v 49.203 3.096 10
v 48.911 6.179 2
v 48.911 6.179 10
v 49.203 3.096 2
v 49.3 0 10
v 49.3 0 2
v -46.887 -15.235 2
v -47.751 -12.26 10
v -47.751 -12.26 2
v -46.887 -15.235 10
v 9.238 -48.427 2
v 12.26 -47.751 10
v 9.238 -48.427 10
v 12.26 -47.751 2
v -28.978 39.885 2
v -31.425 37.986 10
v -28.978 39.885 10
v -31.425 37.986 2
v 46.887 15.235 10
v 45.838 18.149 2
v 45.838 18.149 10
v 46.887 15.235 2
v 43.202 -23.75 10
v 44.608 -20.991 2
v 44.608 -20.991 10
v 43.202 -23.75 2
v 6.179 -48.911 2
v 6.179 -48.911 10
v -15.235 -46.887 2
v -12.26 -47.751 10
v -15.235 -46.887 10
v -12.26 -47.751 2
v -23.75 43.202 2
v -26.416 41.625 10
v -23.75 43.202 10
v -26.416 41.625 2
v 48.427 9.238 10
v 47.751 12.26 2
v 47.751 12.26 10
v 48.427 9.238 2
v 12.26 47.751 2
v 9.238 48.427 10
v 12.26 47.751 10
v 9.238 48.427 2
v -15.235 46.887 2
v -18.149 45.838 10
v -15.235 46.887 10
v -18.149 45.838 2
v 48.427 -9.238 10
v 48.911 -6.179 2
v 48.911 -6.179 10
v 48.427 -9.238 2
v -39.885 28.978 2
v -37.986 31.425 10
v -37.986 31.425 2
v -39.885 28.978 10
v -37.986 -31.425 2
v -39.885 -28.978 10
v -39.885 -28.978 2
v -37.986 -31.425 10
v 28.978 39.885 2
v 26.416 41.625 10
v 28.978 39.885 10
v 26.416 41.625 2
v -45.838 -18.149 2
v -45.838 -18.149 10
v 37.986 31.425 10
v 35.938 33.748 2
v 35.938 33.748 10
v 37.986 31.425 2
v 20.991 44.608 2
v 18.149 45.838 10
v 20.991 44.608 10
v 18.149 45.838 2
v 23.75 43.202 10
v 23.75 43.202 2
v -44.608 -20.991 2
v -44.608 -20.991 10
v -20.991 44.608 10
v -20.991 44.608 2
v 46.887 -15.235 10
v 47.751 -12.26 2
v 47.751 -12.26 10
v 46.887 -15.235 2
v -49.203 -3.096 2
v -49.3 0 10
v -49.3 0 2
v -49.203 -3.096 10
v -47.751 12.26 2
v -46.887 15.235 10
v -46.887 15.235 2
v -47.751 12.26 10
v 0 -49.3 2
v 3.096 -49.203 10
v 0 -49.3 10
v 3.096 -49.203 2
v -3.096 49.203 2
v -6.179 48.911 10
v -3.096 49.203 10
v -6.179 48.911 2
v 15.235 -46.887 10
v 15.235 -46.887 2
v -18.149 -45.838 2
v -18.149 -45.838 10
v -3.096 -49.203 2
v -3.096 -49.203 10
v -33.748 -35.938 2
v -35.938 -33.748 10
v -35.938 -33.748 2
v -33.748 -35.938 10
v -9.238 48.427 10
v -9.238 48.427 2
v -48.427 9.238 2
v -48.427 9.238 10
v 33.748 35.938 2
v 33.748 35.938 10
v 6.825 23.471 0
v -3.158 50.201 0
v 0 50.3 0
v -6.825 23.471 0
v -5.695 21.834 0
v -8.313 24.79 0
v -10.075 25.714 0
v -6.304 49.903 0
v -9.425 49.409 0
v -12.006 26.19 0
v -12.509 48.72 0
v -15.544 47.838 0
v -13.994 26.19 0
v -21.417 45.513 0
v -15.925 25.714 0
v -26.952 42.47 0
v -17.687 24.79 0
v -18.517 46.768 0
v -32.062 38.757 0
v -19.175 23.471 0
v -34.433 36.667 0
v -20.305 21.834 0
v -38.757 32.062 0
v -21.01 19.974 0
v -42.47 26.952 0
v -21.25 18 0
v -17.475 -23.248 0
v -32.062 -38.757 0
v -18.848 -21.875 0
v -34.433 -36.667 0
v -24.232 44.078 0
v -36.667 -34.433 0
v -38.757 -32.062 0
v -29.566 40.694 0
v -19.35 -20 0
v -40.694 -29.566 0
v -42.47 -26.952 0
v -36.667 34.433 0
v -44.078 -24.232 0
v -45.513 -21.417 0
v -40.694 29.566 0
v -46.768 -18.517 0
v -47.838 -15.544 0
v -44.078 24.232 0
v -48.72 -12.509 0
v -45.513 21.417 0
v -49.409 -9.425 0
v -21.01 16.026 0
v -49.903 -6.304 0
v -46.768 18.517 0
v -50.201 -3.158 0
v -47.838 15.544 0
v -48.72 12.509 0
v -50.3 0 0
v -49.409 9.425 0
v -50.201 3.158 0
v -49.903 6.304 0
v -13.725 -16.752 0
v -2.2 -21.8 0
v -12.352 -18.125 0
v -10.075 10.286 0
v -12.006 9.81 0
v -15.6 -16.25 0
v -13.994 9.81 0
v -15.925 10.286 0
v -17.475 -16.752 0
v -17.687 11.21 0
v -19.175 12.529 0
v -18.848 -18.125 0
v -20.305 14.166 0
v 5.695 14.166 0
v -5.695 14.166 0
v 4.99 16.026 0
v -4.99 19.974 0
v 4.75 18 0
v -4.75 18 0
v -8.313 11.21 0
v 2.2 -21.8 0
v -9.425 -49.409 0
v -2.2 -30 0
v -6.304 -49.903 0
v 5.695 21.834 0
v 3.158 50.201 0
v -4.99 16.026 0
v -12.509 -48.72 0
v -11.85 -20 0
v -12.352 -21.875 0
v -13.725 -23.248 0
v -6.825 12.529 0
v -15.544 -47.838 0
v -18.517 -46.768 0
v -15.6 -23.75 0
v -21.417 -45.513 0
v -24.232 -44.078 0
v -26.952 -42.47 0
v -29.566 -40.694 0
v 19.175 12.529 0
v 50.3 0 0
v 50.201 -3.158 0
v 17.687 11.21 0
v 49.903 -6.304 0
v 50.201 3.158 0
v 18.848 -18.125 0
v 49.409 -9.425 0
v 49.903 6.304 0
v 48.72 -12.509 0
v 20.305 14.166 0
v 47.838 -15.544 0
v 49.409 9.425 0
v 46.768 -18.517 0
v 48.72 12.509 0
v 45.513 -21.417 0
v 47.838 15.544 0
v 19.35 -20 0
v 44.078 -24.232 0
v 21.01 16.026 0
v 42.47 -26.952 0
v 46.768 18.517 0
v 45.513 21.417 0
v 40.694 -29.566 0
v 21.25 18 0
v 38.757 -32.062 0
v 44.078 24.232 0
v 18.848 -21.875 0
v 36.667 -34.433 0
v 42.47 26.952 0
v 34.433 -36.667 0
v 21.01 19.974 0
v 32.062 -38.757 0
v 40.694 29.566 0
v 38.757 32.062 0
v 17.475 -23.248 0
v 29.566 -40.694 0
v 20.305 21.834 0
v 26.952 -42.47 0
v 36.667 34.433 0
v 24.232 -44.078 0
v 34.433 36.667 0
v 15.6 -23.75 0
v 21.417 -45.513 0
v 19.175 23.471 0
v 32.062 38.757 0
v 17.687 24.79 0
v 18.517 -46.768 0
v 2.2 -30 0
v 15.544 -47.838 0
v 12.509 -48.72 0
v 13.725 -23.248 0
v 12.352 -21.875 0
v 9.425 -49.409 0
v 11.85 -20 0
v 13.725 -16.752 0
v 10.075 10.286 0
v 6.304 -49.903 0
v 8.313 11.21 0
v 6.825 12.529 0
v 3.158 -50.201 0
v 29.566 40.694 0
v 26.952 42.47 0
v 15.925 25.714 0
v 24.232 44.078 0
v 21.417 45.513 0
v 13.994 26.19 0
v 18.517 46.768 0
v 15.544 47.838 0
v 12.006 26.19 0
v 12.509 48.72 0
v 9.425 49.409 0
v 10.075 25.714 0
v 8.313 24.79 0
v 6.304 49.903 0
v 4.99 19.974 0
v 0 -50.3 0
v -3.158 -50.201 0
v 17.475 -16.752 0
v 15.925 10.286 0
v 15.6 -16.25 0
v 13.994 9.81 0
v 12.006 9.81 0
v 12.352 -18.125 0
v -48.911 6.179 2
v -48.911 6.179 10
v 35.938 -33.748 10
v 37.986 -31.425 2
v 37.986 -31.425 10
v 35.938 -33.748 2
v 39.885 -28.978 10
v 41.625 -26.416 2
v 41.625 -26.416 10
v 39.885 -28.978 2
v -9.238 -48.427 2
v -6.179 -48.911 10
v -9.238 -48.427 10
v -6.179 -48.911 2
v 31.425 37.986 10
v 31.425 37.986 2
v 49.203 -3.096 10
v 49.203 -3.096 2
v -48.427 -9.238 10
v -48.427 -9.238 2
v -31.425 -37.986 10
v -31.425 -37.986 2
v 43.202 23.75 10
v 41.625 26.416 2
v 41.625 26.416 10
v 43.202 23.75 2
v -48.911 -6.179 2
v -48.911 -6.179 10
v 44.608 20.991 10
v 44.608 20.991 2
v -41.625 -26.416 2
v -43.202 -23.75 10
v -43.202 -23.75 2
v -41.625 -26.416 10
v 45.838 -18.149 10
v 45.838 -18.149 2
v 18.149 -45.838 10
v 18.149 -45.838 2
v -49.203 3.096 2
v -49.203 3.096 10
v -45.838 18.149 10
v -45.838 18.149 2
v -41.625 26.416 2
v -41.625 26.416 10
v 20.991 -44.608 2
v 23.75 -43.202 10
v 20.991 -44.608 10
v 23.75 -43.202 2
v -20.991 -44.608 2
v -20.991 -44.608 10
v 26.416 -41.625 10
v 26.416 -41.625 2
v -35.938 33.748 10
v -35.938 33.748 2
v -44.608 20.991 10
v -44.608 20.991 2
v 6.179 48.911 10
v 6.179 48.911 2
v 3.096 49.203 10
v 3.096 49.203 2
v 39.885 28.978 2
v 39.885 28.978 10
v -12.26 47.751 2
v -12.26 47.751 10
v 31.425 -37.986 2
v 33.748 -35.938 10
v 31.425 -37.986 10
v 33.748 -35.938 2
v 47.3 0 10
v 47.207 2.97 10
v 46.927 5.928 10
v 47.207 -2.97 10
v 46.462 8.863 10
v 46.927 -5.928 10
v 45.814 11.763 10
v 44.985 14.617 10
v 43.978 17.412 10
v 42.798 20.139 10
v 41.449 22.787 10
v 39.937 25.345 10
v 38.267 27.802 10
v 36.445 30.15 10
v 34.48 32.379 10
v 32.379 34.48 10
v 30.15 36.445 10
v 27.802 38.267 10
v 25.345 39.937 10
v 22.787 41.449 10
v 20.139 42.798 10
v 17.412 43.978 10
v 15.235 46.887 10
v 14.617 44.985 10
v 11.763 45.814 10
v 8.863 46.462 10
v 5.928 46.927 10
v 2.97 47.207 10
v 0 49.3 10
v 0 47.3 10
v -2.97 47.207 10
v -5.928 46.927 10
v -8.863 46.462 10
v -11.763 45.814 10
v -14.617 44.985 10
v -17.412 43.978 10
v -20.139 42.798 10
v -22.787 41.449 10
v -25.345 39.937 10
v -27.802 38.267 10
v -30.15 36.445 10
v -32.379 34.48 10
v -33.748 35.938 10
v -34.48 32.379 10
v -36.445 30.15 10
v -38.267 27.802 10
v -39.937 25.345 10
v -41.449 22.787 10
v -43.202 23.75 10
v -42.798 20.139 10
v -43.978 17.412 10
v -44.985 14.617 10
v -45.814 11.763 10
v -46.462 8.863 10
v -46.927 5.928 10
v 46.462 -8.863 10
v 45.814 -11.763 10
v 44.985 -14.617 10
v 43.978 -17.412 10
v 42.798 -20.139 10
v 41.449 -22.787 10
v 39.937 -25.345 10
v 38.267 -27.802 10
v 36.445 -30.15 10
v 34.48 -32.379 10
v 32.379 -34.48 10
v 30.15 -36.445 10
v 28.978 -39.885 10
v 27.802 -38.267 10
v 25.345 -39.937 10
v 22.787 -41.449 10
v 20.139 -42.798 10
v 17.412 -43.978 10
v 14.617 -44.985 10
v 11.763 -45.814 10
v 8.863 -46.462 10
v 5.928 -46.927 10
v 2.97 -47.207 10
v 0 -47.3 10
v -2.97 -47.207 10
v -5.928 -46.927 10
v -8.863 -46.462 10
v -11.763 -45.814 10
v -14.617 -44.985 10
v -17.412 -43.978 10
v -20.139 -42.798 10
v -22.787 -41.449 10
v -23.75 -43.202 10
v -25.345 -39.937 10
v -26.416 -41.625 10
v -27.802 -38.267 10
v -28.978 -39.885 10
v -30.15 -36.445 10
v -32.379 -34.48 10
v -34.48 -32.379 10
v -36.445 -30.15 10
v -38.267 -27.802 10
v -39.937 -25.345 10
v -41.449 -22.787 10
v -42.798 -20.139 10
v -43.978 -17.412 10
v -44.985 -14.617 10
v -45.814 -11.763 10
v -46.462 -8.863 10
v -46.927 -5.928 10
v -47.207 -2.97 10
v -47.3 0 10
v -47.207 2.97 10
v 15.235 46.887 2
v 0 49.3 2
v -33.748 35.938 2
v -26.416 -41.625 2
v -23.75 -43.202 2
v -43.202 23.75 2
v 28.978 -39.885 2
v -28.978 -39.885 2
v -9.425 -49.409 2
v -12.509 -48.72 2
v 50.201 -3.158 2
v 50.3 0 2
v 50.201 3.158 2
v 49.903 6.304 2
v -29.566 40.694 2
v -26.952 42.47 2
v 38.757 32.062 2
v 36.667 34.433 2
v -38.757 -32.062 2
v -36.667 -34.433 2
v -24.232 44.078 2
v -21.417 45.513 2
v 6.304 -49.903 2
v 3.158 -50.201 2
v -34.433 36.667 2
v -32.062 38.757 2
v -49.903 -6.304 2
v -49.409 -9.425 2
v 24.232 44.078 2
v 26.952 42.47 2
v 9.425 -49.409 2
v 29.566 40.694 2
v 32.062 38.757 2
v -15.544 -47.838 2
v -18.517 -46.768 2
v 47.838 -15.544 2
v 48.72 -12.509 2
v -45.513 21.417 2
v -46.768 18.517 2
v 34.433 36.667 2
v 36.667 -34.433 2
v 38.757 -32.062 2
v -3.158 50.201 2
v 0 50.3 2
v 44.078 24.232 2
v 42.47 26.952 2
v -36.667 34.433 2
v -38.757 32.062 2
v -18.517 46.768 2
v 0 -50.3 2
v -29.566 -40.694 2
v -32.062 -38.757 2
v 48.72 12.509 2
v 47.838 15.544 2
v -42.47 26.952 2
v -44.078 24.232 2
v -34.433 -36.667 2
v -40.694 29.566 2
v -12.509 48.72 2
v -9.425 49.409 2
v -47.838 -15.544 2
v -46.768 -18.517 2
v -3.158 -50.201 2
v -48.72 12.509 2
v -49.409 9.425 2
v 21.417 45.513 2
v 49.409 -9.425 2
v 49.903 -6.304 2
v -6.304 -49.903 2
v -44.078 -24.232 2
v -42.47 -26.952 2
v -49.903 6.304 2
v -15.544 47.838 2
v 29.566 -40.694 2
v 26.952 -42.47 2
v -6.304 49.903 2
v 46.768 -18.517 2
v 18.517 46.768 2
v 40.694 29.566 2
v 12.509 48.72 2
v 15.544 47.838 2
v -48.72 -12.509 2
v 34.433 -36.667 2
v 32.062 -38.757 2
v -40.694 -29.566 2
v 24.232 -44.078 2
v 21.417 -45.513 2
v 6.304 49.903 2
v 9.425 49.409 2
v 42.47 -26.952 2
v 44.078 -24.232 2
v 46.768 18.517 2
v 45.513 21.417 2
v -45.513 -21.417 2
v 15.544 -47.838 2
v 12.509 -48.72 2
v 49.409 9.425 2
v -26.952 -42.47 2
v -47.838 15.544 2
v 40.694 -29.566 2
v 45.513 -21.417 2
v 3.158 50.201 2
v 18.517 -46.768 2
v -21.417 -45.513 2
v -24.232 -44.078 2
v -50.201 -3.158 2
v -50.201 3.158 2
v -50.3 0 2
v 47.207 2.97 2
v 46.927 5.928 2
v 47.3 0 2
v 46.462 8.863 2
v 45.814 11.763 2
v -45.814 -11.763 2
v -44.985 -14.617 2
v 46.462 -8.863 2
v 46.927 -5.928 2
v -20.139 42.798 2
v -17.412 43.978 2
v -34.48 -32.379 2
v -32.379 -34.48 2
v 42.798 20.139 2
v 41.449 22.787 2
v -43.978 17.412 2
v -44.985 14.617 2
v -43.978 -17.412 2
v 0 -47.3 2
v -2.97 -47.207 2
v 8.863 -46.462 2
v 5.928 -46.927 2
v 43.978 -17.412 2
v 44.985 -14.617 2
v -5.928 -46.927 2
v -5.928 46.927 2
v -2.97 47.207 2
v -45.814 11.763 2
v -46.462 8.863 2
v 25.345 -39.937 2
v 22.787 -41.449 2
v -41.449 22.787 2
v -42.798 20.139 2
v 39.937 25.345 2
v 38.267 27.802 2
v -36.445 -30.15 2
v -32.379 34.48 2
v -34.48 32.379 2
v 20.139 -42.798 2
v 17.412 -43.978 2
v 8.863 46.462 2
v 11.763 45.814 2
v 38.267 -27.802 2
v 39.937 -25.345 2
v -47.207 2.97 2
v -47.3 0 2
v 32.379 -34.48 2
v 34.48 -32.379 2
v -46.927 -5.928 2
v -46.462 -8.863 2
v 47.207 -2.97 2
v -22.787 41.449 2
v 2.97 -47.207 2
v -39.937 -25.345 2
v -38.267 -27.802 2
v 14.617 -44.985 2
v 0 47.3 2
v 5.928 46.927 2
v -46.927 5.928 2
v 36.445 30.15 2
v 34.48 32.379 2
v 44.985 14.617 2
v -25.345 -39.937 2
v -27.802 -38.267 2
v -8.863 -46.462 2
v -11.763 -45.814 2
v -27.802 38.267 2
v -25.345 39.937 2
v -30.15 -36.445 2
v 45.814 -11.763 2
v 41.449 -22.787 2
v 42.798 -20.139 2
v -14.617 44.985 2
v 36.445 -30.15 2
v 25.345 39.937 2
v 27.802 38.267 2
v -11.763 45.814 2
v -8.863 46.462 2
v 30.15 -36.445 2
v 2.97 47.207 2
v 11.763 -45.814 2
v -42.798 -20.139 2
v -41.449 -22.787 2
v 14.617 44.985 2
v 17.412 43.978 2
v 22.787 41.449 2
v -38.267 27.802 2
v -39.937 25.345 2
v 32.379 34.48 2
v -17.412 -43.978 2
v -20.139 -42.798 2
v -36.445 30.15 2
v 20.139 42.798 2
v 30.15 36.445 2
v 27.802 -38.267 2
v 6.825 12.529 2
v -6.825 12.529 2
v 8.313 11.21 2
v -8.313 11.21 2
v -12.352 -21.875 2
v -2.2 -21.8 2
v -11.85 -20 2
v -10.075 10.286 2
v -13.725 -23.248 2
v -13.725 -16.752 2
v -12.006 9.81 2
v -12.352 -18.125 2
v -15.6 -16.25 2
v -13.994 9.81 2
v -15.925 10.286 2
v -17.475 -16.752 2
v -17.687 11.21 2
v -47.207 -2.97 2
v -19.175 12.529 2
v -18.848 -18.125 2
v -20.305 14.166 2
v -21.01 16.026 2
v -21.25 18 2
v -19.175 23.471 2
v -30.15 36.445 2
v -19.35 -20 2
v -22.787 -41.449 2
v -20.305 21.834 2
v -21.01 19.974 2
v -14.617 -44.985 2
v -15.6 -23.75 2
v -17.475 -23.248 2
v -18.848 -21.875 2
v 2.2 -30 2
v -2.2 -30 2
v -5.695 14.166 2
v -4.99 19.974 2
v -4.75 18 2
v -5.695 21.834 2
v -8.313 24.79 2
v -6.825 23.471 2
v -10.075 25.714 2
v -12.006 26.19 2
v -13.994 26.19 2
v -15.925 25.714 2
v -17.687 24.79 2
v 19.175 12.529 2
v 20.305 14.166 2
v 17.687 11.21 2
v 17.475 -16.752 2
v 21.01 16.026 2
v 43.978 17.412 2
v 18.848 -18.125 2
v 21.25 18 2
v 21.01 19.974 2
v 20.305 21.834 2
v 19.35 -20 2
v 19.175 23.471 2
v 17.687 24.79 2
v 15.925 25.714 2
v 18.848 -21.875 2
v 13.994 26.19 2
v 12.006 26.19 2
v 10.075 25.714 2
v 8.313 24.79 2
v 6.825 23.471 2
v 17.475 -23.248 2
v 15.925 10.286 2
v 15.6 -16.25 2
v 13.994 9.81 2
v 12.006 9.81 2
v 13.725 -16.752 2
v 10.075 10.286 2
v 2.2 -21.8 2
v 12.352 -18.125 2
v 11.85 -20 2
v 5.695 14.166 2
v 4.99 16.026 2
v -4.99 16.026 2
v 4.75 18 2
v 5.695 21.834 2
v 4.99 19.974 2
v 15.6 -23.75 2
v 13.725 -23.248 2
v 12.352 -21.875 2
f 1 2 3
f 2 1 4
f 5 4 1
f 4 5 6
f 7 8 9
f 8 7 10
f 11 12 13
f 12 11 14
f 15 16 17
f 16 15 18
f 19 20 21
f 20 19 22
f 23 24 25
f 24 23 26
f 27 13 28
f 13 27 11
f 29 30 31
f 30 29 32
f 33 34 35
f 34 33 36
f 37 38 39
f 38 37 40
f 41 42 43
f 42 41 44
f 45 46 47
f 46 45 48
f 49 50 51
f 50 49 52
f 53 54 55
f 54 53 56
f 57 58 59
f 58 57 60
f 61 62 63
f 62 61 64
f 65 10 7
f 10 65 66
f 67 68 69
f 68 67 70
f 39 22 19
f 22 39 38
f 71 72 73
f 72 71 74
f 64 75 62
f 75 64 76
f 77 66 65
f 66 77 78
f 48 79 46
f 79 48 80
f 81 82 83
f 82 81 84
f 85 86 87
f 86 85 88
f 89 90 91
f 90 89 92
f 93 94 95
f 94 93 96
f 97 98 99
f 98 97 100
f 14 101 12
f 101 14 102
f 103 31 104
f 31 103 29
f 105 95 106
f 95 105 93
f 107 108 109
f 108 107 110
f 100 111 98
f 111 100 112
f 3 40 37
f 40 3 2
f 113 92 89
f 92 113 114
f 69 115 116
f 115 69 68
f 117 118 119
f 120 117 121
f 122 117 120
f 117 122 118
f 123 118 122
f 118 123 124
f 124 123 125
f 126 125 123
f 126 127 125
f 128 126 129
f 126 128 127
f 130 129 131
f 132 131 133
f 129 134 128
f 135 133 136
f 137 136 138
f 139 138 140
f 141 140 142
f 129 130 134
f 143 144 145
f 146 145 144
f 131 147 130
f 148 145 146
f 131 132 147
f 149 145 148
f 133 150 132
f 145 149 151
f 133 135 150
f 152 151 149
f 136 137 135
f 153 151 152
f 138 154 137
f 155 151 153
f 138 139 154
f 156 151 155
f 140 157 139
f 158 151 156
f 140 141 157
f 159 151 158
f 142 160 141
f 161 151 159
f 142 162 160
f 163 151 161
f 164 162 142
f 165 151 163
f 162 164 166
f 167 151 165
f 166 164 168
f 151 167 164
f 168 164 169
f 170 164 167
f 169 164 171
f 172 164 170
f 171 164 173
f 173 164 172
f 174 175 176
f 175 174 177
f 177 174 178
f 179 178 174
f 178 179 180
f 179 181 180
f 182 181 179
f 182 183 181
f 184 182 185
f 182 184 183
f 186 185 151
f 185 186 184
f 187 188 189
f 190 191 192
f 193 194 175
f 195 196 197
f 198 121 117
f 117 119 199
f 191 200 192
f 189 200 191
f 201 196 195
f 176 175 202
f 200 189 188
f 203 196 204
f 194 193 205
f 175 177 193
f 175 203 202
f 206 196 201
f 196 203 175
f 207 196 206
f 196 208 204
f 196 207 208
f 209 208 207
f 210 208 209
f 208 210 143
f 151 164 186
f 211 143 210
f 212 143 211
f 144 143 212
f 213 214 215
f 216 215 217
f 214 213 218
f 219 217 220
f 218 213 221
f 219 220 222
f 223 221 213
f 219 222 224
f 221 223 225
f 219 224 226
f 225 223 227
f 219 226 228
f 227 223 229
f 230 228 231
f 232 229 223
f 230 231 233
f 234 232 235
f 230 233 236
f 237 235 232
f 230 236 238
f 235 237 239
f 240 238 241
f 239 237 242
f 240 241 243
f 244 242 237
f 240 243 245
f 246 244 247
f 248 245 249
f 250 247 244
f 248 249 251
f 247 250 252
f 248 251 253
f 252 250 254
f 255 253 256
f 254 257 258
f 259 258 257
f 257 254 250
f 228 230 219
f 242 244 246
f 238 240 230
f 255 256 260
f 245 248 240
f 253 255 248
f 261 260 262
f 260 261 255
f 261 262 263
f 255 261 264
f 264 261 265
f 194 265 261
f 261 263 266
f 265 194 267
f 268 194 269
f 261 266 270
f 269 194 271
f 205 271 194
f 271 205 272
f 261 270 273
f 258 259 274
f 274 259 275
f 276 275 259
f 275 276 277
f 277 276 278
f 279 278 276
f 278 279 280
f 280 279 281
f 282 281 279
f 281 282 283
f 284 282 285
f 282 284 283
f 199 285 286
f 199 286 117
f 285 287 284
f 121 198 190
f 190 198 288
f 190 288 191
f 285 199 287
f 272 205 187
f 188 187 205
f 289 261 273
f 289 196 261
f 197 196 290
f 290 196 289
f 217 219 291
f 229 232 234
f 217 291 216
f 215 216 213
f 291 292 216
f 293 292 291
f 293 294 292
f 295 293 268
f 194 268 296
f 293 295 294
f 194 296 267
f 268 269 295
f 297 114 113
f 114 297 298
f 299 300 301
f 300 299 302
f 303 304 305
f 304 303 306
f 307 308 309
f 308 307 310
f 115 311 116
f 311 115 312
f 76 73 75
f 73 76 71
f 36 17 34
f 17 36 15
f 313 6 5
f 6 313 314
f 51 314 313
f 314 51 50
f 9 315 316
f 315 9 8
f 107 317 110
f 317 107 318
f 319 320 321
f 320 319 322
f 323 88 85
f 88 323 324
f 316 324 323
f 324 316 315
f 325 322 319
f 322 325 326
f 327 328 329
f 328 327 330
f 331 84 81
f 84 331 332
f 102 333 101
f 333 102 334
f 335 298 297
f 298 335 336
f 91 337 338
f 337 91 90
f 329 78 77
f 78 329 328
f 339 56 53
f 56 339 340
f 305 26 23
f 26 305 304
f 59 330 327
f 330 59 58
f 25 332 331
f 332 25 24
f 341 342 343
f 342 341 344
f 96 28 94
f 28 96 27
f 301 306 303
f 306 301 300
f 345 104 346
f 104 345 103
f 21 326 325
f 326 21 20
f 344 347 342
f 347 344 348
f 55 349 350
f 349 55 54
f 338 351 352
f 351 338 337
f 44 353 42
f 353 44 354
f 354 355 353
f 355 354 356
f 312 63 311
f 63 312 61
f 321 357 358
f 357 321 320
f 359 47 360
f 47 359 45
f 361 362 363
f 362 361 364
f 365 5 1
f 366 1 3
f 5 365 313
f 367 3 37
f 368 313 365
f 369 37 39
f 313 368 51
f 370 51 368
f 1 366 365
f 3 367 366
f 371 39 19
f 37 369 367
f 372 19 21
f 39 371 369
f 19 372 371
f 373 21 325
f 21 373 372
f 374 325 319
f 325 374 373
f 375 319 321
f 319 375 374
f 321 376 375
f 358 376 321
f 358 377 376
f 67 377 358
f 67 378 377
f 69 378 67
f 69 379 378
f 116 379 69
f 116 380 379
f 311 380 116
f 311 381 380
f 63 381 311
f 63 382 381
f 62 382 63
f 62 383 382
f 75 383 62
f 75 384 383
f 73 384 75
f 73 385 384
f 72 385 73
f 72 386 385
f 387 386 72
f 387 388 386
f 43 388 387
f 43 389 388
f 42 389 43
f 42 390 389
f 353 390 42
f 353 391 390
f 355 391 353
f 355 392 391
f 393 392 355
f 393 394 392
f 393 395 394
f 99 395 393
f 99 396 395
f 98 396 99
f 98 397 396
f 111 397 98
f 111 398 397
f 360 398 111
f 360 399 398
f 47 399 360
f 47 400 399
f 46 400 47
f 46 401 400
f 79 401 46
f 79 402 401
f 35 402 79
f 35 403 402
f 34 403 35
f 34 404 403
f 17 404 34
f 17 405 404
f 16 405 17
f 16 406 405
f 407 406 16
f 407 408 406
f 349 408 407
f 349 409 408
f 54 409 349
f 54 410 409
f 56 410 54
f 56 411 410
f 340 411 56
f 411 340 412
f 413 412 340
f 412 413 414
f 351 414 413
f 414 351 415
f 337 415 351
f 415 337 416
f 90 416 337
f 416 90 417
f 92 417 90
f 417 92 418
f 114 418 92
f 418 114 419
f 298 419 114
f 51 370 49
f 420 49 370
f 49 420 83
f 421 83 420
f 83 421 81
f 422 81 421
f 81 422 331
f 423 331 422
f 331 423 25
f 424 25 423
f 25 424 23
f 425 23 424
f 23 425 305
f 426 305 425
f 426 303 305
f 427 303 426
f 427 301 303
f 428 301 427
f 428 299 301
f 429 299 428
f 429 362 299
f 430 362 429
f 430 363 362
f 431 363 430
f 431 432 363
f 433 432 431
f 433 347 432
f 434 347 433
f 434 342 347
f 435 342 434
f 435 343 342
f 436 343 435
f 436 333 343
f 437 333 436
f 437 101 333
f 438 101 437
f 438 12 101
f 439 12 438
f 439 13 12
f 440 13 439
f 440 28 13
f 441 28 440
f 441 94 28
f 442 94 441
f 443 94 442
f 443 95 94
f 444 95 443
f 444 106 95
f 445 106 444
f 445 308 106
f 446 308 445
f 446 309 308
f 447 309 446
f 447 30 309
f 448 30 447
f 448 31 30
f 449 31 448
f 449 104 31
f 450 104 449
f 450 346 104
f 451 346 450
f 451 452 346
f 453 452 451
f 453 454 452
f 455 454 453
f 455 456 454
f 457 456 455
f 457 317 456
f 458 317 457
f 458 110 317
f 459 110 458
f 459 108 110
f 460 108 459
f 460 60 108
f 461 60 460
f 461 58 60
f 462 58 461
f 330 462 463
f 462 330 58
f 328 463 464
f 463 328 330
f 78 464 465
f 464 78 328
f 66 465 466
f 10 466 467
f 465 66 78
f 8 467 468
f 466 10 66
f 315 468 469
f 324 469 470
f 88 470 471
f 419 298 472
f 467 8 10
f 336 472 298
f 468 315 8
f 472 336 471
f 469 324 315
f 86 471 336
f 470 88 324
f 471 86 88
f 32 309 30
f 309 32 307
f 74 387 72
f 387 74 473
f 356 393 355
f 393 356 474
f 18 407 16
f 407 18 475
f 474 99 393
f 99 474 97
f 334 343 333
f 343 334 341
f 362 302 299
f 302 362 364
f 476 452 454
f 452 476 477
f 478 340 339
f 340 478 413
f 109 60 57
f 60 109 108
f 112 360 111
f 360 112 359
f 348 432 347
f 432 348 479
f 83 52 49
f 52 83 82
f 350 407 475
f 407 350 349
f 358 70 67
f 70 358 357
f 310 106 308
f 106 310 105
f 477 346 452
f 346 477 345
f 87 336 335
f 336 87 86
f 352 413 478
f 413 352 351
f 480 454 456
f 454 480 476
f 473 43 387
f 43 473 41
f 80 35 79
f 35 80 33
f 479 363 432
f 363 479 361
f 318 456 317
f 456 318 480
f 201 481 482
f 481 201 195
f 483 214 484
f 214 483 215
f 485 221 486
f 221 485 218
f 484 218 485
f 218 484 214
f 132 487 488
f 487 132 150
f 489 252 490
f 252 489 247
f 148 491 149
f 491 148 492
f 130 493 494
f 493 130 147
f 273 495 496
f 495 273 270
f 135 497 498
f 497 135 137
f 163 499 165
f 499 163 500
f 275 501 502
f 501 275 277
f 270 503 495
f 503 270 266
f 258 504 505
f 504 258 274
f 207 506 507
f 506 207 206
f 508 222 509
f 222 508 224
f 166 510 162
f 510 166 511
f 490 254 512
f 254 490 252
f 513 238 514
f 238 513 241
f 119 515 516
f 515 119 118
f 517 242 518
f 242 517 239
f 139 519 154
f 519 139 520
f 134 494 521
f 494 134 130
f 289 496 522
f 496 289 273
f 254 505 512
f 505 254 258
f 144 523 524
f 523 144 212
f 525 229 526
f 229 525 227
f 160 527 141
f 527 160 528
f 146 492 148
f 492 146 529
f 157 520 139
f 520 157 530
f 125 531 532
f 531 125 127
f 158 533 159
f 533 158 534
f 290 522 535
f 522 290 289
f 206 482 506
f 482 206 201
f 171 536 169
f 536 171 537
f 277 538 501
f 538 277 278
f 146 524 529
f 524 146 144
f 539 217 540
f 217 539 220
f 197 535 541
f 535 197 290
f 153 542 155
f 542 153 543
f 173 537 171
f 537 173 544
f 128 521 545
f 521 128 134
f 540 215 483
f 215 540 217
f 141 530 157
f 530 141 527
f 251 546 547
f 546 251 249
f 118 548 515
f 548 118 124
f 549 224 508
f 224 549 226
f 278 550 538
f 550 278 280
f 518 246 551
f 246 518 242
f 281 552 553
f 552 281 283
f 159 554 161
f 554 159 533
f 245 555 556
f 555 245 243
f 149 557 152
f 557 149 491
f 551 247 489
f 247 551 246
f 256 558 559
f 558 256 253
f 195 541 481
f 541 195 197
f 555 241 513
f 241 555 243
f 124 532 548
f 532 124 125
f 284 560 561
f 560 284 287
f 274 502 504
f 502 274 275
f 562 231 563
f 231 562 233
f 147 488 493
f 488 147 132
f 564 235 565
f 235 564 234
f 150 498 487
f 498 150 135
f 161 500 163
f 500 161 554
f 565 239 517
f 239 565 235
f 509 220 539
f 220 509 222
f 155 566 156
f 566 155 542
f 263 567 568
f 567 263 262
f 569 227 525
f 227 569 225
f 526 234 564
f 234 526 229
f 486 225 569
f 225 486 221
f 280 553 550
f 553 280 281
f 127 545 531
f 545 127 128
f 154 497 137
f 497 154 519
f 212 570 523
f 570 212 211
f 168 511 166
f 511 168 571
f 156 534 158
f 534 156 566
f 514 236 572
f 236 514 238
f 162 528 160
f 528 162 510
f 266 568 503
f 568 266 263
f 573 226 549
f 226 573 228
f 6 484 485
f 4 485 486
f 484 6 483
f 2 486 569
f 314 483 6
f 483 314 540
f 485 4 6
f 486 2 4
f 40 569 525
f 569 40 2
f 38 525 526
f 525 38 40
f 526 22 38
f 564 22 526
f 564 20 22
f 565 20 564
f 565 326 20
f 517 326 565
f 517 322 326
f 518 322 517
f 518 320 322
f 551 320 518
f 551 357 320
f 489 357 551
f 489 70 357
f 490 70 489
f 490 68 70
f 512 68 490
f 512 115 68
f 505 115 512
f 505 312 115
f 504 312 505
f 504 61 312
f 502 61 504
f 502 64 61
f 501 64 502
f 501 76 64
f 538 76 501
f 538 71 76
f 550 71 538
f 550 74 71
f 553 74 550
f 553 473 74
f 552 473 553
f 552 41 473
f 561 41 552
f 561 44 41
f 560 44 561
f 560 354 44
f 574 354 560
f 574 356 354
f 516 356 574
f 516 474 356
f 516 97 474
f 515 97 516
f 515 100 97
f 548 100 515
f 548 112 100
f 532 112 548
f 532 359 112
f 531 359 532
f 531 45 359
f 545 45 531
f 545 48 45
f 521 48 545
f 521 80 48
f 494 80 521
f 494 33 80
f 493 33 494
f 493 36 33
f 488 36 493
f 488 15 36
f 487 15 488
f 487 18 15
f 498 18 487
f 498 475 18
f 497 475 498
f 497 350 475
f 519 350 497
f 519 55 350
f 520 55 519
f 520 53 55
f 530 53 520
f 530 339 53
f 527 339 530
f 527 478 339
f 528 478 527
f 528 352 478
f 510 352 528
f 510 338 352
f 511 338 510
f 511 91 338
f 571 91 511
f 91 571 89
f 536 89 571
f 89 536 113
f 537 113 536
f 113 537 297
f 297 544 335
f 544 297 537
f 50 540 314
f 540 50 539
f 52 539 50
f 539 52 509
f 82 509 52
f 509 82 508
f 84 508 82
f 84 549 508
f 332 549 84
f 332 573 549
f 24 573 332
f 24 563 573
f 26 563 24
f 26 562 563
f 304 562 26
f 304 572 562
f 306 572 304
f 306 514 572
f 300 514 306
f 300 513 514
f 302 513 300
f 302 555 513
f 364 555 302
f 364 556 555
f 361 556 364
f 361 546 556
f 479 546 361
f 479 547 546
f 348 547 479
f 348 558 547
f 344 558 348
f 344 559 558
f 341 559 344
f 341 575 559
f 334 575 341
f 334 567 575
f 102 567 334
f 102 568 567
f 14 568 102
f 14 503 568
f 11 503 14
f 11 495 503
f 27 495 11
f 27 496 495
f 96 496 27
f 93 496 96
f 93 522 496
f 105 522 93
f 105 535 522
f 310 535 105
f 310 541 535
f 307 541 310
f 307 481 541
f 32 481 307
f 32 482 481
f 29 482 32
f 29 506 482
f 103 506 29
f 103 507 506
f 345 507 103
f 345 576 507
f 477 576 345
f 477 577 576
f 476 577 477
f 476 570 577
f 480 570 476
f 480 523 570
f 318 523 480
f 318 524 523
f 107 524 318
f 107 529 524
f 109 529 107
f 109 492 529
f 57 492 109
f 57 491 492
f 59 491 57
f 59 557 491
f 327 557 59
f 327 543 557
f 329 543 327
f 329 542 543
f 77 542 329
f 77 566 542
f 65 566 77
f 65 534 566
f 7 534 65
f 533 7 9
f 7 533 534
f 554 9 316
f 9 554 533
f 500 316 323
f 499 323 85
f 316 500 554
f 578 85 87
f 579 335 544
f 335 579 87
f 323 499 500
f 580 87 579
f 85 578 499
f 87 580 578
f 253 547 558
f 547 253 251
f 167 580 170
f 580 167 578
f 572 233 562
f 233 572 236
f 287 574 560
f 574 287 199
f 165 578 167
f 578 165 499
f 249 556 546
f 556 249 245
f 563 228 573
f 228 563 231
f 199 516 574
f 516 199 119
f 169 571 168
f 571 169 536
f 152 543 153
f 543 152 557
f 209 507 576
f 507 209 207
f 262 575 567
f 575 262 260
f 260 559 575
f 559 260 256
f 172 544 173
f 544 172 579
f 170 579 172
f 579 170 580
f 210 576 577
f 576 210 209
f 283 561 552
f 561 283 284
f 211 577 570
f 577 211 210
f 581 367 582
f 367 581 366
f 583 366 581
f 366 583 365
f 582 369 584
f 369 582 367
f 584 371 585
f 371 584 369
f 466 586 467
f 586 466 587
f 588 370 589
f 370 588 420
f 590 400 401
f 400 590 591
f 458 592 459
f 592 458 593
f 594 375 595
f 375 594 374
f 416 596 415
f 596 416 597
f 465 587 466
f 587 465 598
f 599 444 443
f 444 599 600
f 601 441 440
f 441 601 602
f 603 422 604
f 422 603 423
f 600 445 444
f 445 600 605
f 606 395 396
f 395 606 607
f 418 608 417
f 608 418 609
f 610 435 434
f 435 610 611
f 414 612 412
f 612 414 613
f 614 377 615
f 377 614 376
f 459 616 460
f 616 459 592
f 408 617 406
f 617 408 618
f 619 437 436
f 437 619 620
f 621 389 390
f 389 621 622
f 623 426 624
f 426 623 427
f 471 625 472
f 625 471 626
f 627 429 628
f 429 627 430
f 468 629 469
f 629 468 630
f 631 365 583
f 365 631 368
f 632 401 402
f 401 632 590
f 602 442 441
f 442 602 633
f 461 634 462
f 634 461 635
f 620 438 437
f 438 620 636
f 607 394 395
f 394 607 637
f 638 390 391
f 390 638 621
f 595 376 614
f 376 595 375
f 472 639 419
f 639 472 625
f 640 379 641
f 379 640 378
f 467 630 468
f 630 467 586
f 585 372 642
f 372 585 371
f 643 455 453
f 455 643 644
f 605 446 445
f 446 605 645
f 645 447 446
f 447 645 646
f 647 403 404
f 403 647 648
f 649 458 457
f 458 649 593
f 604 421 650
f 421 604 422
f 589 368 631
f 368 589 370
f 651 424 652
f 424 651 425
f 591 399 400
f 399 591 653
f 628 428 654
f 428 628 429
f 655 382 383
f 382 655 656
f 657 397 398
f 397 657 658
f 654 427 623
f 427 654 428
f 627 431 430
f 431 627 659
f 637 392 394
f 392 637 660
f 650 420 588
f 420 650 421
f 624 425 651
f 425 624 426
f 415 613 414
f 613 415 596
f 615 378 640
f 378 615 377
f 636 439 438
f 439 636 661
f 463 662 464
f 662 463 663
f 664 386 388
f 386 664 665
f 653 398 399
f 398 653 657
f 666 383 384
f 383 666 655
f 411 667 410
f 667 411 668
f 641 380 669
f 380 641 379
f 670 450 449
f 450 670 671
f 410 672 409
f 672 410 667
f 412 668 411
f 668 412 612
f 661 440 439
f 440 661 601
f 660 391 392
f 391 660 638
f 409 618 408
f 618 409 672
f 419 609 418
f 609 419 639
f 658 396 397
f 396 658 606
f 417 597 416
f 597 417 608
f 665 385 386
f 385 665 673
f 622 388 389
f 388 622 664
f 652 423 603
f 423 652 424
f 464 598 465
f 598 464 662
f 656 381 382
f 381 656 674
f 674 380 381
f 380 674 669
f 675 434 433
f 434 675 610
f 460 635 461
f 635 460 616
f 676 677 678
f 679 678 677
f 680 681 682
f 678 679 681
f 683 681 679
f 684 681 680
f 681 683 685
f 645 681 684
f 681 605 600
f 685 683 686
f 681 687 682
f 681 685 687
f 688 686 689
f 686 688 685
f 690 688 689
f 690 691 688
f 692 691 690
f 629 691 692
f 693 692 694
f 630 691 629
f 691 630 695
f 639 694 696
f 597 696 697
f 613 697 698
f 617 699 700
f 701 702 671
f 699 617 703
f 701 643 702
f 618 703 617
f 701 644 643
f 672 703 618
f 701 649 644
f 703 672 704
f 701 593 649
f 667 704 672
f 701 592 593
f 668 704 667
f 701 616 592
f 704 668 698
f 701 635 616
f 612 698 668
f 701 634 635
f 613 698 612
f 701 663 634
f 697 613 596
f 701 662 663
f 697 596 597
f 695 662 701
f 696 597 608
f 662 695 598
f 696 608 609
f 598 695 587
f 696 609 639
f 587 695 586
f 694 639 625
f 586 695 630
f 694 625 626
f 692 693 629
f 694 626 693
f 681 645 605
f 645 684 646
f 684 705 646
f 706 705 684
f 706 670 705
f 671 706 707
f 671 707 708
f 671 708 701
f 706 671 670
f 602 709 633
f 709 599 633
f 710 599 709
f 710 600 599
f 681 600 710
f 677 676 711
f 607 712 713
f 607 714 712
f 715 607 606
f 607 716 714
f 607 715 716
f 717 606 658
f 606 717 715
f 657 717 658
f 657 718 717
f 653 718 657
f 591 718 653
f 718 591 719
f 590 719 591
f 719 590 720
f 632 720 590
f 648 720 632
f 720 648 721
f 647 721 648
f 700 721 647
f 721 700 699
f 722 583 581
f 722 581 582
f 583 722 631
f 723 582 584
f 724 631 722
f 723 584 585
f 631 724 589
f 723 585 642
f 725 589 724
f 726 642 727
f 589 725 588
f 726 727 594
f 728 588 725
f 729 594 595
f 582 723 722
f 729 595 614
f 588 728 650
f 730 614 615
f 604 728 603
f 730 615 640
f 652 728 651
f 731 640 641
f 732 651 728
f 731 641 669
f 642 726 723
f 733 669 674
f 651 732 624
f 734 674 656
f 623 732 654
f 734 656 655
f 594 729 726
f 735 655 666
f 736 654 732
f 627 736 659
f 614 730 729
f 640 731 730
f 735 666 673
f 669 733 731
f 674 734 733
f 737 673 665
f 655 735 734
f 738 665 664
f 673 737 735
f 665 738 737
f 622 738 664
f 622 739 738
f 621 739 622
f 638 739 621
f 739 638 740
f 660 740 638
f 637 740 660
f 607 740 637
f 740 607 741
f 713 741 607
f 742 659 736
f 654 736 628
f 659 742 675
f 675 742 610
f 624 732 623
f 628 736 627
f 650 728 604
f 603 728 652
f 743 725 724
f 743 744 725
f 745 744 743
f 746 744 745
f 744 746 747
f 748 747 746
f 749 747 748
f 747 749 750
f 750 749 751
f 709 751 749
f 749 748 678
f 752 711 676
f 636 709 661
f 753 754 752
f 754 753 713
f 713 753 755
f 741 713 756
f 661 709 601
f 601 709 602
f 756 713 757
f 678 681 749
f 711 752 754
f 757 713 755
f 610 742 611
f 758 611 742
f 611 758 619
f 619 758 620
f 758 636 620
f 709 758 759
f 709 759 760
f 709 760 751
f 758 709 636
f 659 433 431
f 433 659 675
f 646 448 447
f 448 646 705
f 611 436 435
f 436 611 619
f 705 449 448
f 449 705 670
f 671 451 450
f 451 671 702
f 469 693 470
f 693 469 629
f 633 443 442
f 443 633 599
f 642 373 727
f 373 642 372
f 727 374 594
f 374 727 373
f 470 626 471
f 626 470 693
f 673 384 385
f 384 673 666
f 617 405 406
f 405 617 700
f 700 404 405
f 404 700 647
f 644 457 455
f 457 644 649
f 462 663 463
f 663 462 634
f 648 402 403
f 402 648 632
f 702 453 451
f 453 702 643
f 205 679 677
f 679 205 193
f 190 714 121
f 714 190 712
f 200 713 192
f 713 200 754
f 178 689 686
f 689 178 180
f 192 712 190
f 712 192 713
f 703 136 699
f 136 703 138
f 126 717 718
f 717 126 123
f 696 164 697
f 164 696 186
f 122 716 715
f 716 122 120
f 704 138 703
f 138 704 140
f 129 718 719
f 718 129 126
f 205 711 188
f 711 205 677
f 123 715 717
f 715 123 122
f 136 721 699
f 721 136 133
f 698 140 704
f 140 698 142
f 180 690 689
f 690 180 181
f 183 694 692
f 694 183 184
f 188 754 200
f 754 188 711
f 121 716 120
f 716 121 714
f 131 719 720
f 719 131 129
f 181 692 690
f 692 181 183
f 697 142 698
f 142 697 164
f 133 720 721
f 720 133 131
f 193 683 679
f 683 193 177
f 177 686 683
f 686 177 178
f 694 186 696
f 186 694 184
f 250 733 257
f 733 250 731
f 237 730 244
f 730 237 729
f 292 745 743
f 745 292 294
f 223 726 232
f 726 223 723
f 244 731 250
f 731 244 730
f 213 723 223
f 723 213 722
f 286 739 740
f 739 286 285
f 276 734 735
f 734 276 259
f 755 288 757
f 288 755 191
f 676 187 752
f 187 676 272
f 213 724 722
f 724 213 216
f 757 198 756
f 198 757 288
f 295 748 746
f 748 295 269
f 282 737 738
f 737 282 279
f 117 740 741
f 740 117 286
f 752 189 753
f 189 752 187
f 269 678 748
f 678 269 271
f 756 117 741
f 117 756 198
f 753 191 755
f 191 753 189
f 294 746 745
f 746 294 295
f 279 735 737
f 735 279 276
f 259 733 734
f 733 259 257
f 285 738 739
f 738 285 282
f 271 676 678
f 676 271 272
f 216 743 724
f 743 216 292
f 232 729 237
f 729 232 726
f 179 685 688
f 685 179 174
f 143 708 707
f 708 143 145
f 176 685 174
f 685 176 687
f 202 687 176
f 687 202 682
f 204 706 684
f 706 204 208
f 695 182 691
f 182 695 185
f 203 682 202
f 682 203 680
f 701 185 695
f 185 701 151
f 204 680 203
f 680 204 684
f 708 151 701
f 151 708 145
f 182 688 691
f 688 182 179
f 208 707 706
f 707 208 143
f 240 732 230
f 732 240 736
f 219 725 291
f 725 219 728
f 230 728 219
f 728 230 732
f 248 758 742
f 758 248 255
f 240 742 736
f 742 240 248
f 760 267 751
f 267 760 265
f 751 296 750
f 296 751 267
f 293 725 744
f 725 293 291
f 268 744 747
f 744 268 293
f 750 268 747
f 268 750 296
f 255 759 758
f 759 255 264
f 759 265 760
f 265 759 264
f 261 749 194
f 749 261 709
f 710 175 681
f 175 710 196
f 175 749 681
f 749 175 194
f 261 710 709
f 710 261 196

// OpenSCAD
FN=100;
RADIUS = 48.8;
LIFT = 1;
COLUMN_WIDTH = 10;
SEGMENTS_COUNT = 6;
LAYER_THICKNESS = 5;
LAYER_COLUMNS_WIDTH = 5;


module base() {
    difference() {
        cylinder(20, RADIUS-LIFT/2, RADIUS-LIFT/2, $fn=FN);
        translate([0, 0, 2])
        cylinder(20, RADIUS-2-LIFT/2, RADIUS-2-LIFT/2, $fn=FN);
    }
    
    cylinder(2, RADIUS-LIFT/2+3, RADIUS-LIFT/2+3, $fn=FN);

}

module segment(height) {
    cylinder(height, COLUMN_WIDTH/2, COLUMN_WIDTH/2, $fn=FN);
}

module layer(radius) {
    linear_extrude(LAYER_THICKNESS)
    for(i=[0:SEGMENTS_COUNT]) {
        rotate([0, 0, i*(360/SEGMENTS_COUNT)])
        translate([0, -LAYER_COLUMNS_WIDTH/2])
        square([radius, LAYER_COLUMNS_WIDTH]);
    };  
} 

ECHO_SIZE = 15.5;
ECHO_DIST = 41.5 - ECHO_SIZE;
BUTTON_SIZE = 6.5;


module top() {
    *cylinder(10, 5, 5);
    difference() {
        union() {
            cylinder(10, RADIUS-LIFT/2+1, RADIUS-LIFT/2+1, $fn=FN);
            cylinder(2, RADIUS-LIFT/2+2, RADIUS-LIFT/2+2, $fn=FN);
            
            
        }
        translate([0, 0, 2])
        cylinder(10, RADIUS-LIFT/2-1, RADIUS-LIFT/2-1, $fn=FN);
        
        translate([-ECHO_DIST/2, 18, -5])
        cylinder(100, ECHO_SIZE/2+LIFT/2, ECHO_SIZE/2+LIFT/2);
        
        translate([ECHO_DIST/2, 18, -5])
        cylinder(100, ECHO_SIZE/2+LIFT/2, ECHO_SIZE/2+LIFT/2);
        
        translate([-ECHO_DIST/2*1.2, -20, -5])
        cylinder(100, BUTTON_SIZE/2+LIFT/2, BUTTON_SIZE/2+LIFT/2);
        
        translate([ECHO_DIST/2*1.2, -20, -5])
        cylinder(100, BUTTON_SIZE/2+LIFT/2, BUTTON_SIZE/2+LIFT/2);
        
        translate([-3.9/2-LIFT/4, -30, -1])
        cube([3.9+LIFT/2, 7.7+LIFT/2, 10]);
        
    }
    
    
}

*base();

segment(24);

layer(15);

!top();
